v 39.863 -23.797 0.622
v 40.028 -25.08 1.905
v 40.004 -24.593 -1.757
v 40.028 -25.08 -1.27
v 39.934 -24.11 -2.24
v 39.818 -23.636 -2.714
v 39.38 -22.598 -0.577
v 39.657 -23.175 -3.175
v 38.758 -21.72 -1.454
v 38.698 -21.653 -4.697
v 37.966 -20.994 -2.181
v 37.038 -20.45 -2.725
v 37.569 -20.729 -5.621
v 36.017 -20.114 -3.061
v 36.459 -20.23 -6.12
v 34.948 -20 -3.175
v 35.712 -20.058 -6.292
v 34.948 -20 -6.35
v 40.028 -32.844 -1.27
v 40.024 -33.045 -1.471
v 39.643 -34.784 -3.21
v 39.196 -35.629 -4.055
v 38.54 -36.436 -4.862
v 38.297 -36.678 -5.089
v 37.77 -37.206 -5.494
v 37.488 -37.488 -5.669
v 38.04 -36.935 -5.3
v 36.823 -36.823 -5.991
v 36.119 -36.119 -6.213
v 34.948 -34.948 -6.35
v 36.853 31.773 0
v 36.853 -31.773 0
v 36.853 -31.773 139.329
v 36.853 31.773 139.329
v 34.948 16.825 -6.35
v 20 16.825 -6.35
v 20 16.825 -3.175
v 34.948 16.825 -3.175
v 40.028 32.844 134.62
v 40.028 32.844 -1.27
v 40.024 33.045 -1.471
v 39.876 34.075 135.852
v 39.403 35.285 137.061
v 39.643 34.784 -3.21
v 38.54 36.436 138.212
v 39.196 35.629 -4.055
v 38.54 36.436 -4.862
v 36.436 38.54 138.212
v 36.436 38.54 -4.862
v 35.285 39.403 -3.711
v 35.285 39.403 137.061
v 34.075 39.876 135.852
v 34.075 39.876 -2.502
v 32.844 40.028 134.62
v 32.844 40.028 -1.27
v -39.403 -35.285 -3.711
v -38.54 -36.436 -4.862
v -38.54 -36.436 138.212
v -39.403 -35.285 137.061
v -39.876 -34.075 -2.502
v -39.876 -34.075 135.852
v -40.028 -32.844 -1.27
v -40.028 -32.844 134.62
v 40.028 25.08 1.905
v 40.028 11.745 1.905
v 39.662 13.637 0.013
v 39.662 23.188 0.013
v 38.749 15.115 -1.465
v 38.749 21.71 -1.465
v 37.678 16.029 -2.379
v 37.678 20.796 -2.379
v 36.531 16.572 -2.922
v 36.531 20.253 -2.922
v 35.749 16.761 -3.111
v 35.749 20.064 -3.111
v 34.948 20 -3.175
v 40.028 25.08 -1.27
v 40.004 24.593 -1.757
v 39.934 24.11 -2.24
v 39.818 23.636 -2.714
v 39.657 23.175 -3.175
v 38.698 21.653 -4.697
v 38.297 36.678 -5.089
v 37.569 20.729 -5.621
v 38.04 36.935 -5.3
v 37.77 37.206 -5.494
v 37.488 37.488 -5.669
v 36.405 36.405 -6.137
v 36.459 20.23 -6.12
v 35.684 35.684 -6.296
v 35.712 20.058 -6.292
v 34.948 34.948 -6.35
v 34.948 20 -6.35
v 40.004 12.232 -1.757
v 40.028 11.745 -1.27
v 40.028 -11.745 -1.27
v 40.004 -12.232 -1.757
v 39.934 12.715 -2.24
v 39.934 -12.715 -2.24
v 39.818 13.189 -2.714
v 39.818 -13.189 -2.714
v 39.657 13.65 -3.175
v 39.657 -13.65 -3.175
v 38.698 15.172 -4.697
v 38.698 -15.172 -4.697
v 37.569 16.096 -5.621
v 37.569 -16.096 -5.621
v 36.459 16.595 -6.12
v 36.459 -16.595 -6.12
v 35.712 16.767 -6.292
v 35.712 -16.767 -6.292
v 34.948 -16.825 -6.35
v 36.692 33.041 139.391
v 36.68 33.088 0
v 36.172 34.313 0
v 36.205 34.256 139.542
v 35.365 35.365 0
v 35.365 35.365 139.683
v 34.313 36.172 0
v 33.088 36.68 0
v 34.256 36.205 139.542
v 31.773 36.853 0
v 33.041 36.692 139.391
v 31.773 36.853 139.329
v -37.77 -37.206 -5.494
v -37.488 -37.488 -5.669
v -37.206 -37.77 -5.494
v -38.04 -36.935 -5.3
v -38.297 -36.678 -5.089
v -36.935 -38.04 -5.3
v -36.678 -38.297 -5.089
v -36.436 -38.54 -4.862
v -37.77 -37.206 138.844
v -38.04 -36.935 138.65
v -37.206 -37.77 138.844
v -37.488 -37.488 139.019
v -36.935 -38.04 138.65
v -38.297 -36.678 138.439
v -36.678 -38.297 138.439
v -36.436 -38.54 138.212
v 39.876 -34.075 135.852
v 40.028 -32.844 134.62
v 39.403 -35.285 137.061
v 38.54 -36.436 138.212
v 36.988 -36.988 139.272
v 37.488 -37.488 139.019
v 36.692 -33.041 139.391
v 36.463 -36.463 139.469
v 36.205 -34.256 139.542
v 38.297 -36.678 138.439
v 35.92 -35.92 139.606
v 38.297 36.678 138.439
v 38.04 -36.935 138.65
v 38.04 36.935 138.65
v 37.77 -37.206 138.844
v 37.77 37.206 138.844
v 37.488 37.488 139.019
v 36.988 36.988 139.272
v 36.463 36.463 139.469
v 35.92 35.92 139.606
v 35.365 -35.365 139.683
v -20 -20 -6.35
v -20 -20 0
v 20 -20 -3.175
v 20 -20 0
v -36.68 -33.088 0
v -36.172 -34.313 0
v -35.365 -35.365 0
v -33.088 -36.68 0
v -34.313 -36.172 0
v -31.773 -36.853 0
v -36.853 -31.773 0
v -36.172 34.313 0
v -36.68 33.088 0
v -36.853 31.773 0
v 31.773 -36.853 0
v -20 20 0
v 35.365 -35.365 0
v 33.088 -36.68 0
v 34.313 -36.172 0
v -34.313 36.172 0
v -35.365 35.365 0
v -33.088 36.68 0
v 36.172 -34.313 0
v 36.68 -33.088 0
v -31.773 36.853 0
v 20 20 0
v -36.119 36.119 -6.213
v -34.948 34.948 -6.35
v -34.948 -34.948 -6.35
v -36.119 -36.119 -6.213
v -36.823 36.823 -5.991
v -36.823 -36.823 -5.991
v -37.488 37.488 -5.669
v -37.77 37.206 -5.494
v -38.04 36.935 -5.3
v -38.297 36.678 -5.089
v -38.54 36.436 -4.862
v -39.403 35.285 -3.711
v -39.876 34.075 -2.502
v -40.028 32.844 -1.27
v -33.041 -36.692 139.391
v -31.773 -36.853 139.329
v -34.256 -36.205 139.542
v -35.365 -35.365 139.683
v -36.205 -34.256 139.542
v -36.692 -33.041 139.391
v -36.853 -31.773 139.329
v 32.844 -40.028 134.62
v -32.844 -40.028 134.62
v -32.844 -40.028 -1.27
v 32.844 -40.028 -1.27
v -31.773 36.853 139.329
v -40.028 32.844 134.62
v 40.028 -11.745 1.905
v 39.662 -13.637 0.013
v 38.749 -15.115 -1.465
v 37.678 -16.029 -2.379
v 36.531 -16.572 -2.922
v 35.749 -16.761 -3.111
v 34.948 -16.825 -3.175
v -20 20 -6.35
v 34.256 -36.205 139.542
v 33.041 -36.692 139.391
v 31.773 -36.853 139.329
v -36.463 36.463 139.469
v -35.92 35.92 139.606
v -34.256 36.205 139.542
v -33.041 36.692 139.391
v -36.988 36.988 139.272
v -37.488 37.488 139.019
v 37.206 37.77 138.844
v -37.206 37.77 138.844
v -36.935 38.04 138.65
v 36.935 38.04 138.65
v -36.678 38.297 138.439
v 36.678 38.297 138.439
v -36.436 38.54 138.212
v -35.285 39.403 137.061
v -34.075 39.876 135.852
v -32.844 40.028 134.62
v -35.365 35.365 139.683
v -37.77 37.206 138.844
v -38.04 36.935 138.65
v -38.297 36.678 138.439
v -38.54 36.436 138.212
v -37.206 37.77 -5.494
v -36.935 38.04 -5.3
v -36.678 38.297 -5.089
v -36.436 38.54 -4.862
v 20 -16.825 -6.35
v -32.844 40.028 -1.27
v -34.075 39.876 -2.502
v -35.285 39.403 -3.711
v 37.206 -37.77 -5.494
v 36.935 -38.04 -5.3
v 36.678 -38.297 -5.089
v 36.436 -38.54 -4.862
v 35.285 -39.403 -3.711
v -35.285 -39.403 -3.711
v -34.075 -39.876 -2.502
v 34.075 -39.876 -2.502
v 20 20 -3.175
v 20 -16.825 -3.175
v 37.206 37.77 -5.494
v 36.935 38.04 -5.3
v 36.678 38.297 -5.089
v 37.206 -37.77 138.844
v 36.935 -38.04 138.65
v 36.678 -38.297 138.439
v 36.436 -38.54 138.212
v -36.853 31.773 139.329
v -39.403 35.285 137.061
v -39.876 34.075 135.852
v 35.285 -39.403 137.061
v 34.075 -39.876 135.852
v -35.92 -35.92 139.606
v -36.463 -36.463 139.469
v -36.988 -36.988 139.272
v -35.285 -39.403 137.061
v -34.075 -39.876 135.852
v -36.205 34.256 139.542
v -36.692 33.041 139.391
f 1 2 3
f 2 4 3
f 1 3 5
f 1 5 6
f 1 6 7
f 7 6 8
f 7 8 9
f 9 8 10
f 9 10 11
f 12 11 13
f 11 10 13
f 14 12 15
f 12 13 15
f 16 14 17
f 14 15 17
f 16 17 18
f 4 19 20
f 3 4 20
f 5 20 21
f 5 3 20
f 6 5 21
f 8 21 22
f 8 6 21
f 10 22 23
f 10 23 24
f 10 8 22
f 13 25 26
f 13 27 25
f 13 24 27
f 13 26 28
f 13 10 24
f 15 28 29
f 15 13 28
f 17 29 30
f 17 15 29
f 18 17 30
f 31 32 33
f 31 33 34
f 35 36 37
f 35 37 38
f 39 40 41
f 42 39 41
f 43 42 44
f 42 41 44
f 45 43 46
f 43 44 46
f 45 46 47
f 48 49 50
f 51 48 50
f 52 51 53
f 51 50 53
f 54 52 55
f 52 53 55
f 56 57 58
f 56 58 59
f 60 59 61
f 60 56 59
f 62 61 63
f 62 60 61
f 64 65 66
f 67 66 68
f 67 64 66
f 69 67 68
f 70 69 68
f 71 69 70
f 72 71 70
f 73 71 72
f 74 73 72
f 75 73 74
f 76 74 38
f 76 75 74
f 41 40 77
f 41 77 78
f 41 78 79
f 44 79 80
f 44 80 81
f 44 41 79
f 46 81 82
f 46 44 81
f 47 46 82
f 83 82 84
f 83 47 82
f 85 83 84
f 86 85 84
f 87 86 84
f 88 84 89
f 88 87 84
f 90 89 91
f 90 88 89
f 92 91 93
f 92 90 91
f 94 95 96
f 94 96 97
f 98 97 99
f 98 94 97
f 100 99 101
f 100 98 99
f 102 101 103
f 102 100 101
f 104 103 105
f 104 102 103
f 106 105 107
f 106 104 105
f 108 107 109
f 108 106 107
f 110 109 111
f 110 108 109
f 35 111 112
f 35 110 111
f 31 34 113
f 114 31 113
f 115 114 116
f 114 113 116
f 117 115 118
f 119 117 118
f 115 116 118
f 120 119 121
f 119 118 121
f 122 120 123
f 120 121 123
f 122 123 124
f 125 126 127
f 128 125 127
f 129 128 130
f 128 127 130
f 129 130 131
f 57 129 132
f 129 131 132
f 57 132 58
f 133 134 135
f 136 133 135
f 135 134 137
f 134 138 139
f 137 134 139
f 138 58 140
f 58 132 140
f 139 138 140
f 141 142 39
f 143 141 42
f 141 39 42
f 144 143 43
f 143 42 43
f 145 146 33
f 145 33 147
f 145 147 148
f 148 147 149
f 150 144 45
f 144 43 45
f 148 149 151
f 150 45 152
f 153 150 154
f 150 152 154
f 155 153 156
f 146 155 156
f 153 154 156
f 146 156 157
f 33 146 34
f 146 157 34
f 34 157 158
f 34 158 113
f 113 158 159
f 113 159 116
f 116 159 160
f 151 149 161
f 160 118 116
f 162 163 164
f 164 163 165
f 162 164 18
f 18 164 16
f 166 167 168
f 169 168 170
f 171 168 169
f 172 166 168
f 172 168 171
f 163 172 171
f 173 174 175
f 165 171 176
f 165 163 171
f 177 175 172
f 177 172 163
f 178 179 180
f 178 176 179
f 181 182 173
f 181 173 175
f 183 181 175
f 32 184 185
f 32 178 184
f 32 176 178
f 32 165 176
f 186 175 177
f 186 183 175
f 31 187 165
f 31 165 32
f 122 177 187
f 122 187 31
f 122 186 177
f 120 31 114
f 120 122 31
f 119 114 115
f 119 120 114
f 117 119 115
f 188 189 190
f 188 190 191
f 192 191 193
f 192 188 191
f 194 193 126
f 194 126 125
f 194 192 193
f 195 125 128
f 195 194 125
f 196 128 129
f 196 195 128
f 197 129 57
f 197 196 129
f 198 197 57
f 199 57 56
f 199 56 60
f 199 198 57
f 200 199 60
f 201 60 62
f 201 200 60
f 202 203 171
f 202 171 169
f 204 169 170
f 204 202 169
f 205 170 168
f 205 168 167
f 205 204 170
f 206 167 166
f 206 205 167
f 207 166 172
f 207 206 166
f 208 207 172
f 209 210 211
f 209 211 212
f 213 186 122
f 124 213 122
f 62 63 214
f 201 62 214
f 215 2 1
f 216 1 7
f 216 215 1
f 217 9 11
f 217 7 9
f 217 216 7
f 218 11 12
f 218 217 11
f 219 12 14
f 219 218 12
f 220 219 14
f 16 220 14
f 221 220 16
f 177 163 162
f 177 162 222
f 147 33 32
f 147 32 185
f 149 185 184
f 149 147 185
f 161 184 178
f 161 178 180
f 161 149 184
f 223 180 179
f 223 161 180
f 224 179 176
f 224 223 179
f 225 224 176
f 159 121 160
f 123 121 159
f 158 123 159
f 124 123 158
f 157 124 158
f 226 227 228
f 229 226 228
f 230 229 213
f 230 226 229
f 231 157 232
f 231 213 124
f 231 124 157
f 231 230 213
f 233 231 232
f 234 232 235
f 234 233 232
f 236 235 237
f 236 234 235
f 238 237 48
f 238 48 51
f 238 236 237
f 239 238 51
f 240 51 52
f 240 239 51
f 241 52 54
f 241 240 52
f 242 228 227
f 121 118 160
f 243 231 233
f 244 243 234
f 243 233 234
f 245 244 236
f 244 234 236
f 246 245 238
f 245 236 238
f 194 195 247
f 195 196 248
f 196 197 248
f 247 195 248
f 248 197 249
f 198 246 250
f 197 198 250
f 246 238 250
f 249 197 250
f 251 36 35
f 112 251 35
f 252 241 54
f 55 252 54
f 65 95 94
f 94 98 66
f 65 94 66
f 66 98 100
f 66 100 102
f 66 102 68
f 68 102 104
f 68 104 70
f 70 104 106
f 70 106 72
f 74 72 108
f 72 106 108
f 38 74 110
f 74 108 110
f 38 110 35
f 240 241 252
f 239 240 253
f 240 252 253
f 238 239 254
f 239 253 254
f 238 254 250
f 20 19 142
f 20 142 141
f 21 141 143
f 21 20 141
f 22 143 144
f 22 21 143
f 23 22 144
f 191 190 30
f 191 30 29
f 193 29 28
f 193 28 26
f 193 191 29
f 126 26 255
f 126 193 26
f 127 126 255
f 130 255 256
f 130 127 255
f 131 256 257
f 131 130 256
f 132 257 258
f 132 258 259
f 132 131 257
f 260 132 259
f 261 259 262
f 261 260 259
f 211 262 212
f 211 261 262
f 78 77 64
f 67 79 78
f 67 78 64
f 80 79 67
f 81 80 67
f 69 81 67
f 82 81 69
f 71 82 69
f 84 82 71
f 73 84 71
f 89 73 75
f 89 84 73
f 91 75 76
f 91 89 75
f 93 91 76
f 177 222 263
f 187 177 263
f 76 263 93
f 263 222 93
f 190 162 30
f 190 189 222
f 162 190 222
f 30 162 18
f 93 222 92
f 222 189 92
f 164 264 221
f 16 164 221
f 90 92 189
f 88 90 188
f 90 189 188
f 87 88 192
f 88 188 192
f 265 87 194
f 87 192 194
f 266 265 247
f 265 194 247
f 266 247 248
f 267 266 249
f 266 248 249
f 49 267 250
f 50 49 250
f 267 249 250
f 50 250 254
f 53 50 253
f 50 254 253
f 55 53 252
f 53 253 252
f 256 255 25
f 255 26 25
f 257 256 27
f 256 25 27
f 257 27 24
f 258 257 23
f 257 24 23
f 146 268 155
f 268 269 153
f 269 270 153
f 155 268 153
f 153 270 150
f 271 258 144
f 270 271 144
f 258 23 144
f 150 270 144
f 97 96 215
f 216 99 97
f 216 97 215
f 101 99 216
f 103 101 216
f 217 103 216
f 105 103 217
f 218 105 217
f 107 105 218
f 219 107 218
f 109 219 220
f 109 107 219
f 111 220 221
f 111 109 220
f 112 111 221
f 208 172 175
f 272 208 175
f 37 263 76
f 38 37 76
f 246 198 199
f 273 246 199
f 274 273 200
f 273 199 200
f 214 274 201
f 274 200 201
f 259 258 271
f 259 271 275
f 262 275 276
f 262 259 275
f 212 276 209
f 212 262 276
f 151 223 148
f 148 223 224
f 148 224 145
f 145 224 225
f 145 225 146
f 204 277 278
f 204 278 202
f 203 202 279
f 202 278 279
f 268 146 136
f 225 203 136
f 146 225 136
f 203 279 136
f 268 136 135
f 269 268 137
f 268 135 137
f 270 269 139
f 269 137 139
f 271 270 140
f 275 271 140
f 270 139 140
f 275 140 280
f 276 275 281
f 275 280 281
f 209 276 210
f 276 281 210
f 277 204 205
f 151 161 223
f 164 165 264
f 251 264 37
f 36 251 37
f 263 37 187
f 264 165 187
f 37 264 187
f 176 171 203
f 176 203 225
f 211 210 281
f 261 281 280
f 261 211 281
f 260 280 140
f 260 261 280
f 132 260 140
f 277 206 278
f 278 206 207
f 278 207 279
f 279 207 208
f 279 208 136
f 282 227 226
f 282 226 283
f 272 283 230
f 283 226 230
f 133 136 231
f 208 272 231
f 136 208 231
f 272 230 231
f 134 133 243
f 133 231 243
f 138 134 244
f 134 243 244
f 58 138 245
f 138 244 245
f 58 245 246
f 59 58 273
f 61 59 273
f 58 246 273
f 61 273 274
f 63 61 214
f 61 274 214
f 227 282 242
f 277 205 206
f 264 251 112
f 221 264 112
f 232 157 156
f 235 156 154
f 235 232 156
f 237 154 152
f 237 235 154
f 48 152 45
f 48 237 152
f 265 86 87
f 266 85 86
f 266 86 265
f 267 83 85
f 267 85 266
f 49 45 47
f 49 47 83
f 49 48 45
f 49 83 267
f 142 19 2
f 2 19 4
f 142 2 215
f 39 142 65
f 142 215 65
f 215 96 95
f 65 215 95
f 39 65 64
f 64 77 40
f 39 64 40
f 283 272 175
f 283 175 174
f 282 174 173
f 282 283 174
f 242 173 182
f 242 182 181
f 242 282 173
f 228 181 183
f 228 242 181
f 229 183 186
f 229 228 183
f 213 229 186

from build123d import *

# Parameters (mm, degrees)
F0_W         = 80.0557104707
F0_H         = 80.0557104707
F0_W_2       = 73.7057104707
F0_H_2       = 73.7057104707
F0_W_3       = 39.99992
F0_H_3       = 39.99992
F1_DEPTH     = 6.35
F2_DEPTH     = 9.144
F3_DEPTH     = 139.7
F4_W         = 20.0278952353
F4_H         = 3.175
F5_DEPTH     = 3.175
F6_SIZE      = 5.08
F7_T1_DEPTH  = 95.2957104707
F7_T3_DEPTH  = 156.5710244843
F7_T5_DEPTH  = 95.2957104707
F7_T7_DEPTH  = 40.3478952353
F7_T9_DEPTH  = 40.3478952353
F7_T11_DEPTH = 15.875
F7_T13_DEPTH = 3.175
F7_T15_DEPTH = 3.175
F7_T17_DEPTH = 59.04992
F7_T23_DEPTH = 28.575
F7_T27_DEPTH = 15.875
F7_T34_DEPTH = 28.575
F7_T38_DEPTH = 15.875
F7_T45_DEPTH = 15.875
F7_T49_DEPTH = 28.575
F7_T56_DEPTH = 15.875
F7_T60_DEPTH = 28.575
F8_R         = 5.08


# Not quite as in the source:
# - a fillet or chamfer that OpenCascade refuses, or shapes differently, is made with other operations: its cross-section is extruded or revolved along the edge and cut away or added


with BuildPart() as f1:
    # F0 (on Top) → F1 (new body)
    with BuildSketch(Plane.XY):
        Rectangle(F0_W, F0_H)
        Rectangle(F0_W_2, F0_H_2, mode=Mode.SUBTRACT)
        Rectangle(F0_W_2, F0_H_2)
        Rectangle(F0_W_3, F0_H_3, mode=Mode.SUBTRACT)
        Rectangle(F0_W_3, F0_H_3)
    extrude(amount=-F1_DEPTH)

    # F0 (on Top) → F2 (cut)
    with BuildSketch(Plane.XY):
        Rectangle(F0_W_3, F0_H_3)
    extrude(amount=-F2_DEPTH, mode=Mode.SUBTRACT)

    # F0 (on Top) → F3 (join)
    with BuildSketch(Plane.XY):
        Rectangle(F0_W, F0_H)
        Rectangle(F0_W_2, F0_H_2, mode=Mode.SUBTRACT)
    extrude(amount=F3_DEPTH)

    # F4 (on face) → F5 (cut)
    with BuildSketch(Plane(origin=(0, 0, -6.35), x_dir=(1, 0, 0), z_dir=(0, 0, -1))):
        with Locations((30.0139076177, 18.41246)):
            Rectangle(F4_W, F4_H)
        with Locations((30.0139076177, -18.41246)):
            Rectangle(F4_W, F4_H)
    extrude(amount=-F5_DEPTH, mode=Mode.SUBTRACT)

    # F6
    f6_edges = [f1.edges().sort_by_distance(p)[0] for p in [
        (40.027855, -40.027855, 66.675),
        (-40.027855, -40.027855, 66.675),
        (-40.027855, 40.027855, 66.675),
        (40.027855, 40.027855, 66.675),
    ]]
    chamfer(f6_edges, length=F6_SIZE)

    # F7: fillet of radius 5.08 on 24 edges, made by hand

    # F7_s2 → F7_t1 (cut)
    with BuildSketch(Plane.XZ.offset(-47.6478552353)):
        with BuildLine():
            ThreePointArc((-34.9478552353, -6.35), (-38.5399576838, -4.8621024484), (-40.0278552353, -1.27))
            Line((-40.0278552353, -1.27), (-40.0278552353, -6.35))
            Line((-40.0278552353, -6.35), (-34.9478552353, -6.35))
        make_face()
        with BuildLine():
            ThreePointArc((-34.9478552353, 139.7), (-38.5399576838, 138.2121024484), (-40.0278552353, 134.62))
            Line((-40.0278552353, 134.62), (-40.0278552353, 139.7))
            Line((-40.0278552353, 139.7), (-34.9478552353, 139.7))
        make_face()
        with BuildLine():
            ThreePointArc((40.0278552353, 134.62), (38.5399576838, 138.2121024484), (34.9478552353, 139.7))
            Line((34.9478552353, 139.7), (40.0278552353, 139.7))
            Line((40.0278552353, 139.7), (40.0278552353, 134.62))
        make_face()
    extrude(amount=F7_T1_DEPTH, mode=Mode.SUBTRACT)

    # F7_s4 → F7_t3 (cut)
    with BuildSketch(Plane.XY.offset(-11.6105122421)):
        with BuildLine():
            ThreePointArc((-38.5399576838, 36.4357527869), (-39.6411632605, 34.7876821749), (-40.0278552353, 32.8436503385))
            Line((-40.0278552353, 32.8436503385), (-40.0278552353, 34.9478552353))
            Line((-40.0278552353, 34.9478552353), (-38.5399576838, 36.4357527869))
        make_face()
        with BuildLine():
            ThreePointArc((-38.5399576838, -36.4357527869), (-39.6411632605, -34.7876821749), (-40.0278552353, -32.8436503385))
            Line((-40.0278552353, -32.8436503385), (-40.0278552353, -34.9478552353))
            Line((-40.0278552353, -34.9478552353), (-38.5399576838, -36.4357527869))
        make_face()
        with BuildLine():
            ThreePointArc((36.4357527869, 38.5399576838), (34.7876821749, 39.6411632605), (32.8436503385, 40.0278552353))
            Line((32.8436503385, 40.0278552353), (34.9478552353, 40.0278552353))
            Line((34.9478552353, 40.0278552353), (36.4357527869, 38.5399576838))
        make_face()
        with BuildLine():
            ThreePointArc((-32.8436503385, 40.0278552353), (-34.7876821749, 39.6411632605), (-36.4357527869, 38.5399576838))
            Line((-36.4357527869, 38.5399576838), (-34.9478552353, 40.0278552353))
            Line((-34.9478552353, 40.0278552353), (-32.8436503385, 40.0278552353))
        make_face()
        with BuildLine():
            ThreePointArc((40.0278552353, -32.8436503385), (39.6411632605, -34.7876821749), (38.5399576838, -36.4357527869))
            Line((38.5399576838, -36.4357527869), (40.0278552353, -34.9478552353))
            Line((40.0278552353, -34.9478552353), (40.0278552353, -32.8436503385))
        make_face()
        with BuildLine():
            ThreePointArc((40.0278552353, 32.8436503385), (39.6411632605, 34.7876821749), (38.5399576838, 36.4357527869))
            Line((38.5399576838, 36.4357527869), (40.0278552353, 34.9478552353))
            Line((40.0278552353, 34.9478552353), (40.0278552353, 32.8436503385))
        make_face()
        with BuildLine():
            ThreePointArc((-32.8436503385, -40.0278552353), (-34.7876821749, -39.6411632605), (-36.4357527869, -38.5399576838))
            Line((-36.4357527869, -38.5399576838), (-34.9478552353, -40.0278552353))
            Line((-34.9478552353, -40.0278552353), (-32.8436503385, -40.0278552353))
        make_face()
        with BuildLine():
            ThreePointArc((36.4357527869, -38.5399576838), (34.7876821749, -39.6411632605), (32.8436503385, -40.0278552353))
            Line((32.8436503385, -40.0278552353), (34.9478552353, -40.0278552353))
            Line((34.9478552353, -40.0278552353), (36.4357527869, -38.5399576838))
        make_face()
    extrude(amount=F7_T3_DEPTH, mode=Mode.SUBTRACT)

    # F7_s6 → F7_t5 (cut)
    with BuildSketch(Plane.YZ.offset(-47.6478552353)):
        with BuildLine():
            ThreePointArc((34.9478552353, -6.35), (38.5399576838, -4.8621024484), (40.0278552353, -1.27))
            Line((40.0278552353, -1.27), (40.0278552353, -6.35))
            Line((40.0278552353, -6.35), (34.9478552353, -6.35))
        make_face()
        with BuildLine():
            ThreePointArc((34.9478552353, 139.7), (38.5399576838, 138.2121024484), (40.0278552353, 134.62))
            Line((40.0278552353, 134.62), (40.0278552353, 139.7))
            Line((40.0278552353, 139.7), (34.9478552353, 139.7))
        make_face()
        with BuildLine():
            ThreePointArc((-34.9478552353, -6.35), (-38.5399576838, -4.8621024484), (-40.0278552353, -1.27))
            Line((-40.0278552353, -1.27), (-40.0278552353, -6.35))
            Line((-40.0278552353, -6.35), (-34.9478552353, -6.35))
        make_face()
        with BuildLine():
            ThreePointArc((-34.9478552353, 139.7), (-38.5399576838, 138.2121024484), (-40.0278552353, 134.62))
            Line((-40.0278552353, 134.62), (-40.0278552353, 139.7))
            Line((-40.0278552353, 139.7), (-34.9478552353, 139.7))
        make_face()
    extrude(amount=F7_T5_DEPTH, mode=Mode.SUBTRACT)

    # F7_s8 → F7_t7 (cut)
    with BuildSketch(Plane.XZ.offset(7.29996)):
        with BuildLine():
            ThreePointArc((40.0278552353, -1.27), (38.5399576838, -4.8621024484), (34.9478552353, -6.35))
            Line((34.9478552353, -6.35), (40.0278552353, -6.35))
            Line((40.0278552353, -6.35), (40.0278552353, -1.27))
        make_face()
    extrude(amount=F7_T7_DEPTH, mode=Mode.SUBTRACT)

    # F7_s10 → F7_t9 (cut)
    with BuildSketch(Plane.XZ.offset(-47.6478552353)):
        with BuildLine():
            ThreePointArc((40.0278552353, -1.27), (38.5399576838, -4.8621024484), (34.9478552353, -6.35))
            Line((34.9478552353, -6.35), (40.0278552353, -6.35))
            Line((40.0278552353, -6.35), (40.0278552353, -1.27))
        make_face()
    extrude(amount=F7_T9_DEPTH, mode=Mode.SUBTRACT)

    # F7_s12 → F7_t11 (cut)
    with BuildSketch(Plane.XY.offset(-19.05)):
        with BuildLine():
            ThreePointArc((40.0278552353, -25.07996), (38.5399576838, -21.4878575516), (34.9478552353, -19.99996))
            Line((34.9478552353, -19.99996), (40.0278552353, -19.99996))
            Line((40.0278552353, -19.99996), (40.0278552353, -25.07996))
        make_face()
        with BuildLine():
            ThreePointArc((40.0278552353, 25.07996), (38.5399576838, 21.4878575516), (34.9478552353, 19.99996))
            Line((34.9478552353, 19.99996), (40.0278552353, 19.99996))
            Line((40.0278552353, 19.99996), (40.0278552353, 25.07996))
        make_face()
        with BuildLine():
            ThreePointArc((40.0278552353, -11.74496), (38.5399576838, -15.3370624484), (34.9478552353, -16.82496))
            Line((34.9478552353, -16.82496), (40.0278552353, -16.82496))
            Line((40.0278552353, -16.82496), (40.0278552353, -11.74496))
        make_face()
        with BuildLine():
            ThreePointArc((40.0278552353, 11.74496), (38.5399576838, 15.3370624484), (34.9478552353, 16.82496))
            Line((34.9478552353, 16.82496), (40.0278552353, 16.82496))
            Line((40.0278552353, 16.82496), (40.0278552353, 11.74496))
        make_face()
    extrude(amount=F7_T11_DEPTH, mode=Mode.SUBTRACT)

    # F7_s14 → F7_t13 (cut)
    with BuildSketch(Plane.XZ.offset(16.82496)):
        with BuildLine():
            ThreePointArc((40.0278552353, 1.905), (38.5399576838, -1.6871024484), (34.9478552353, -3.175))
            Line((34.9478552353, -3.175), (40.0278552353, -3.175))
            Line((40.0278552353, -3.175), (40.0278552353, 1.905))
        make_face()
    extrude(amount=F7_T13_DEPTH, mode=Mode.SUBTRACT)

    # F7_s16 → F7_t15 (cut)
    with BuildSketch(Plane.XZ.offset(-19.99996)):
        with BuildLine():
            ThreePointArc((40.0278552353, 1.905), (38.5399576838, -1.6871024484), (34.9478552353, -3.175))
            Line((34.9478552353, -3.175), (40.0278552353, -3.175))
            Line((40.0278552353, -3.175), (40.0278552353, 1.905))
        make_face()
    extrude(amount=F7_T15_DEPTH, mode=Mode.SUBTRACT)

    # F7_s18 → F7_t17 (cut)
    with BuildSketch(Plane.XZ.offset(-29.52496)):
        with BuildLine():
            ThreePointArc((40.0278552353, -1.27), (38.5399576838, -4.8621024484), (34.9478552353, -6.35))
            Line((34.9478552353, -6.35), (40.0278552353, -6.35))
            Line((40.0278552353, -6.35), (40.0278552353, -1.27))
        make_face()
    extrude(amount=F7_T17_DEPTH, mode=Mode.SUBTRACT)


with BuildPart() as f7_tool21:
    # F7_s22 → F7_t23 (new body)
    with BuildSketch(Plane.XY.offset(-19.05)):
        with BuildLine():
            ThreePointArc((40.0278552353, -25.07996), (38.5399576838, -21.4878575516), (34.9478552353, -19.99996))
            Line((34.9478552353, -19.99996), (40.0278552353, -19.99996))
            Line((40.0278552353, -19.99996), (40.0278552353, -25.07996))
        make_face()
    extrude(amount=F7_T23_DEPTH)

    split(bisect_by=Plane.XY.offset(-3.175), keep=Keep.TOP)


with BuildPart() as f7_tool25:
    # F7_s26 → F7_t27 (new body)
    with BuildSketch(Plane.XZ.offset(16.82496)):
        with BuildLine():
            ThreePointArc((40.0278552353, 1.905), (38.5399576838, -1.6871024484), (34.9478552353, -3.175))
            Line((34.9478552353, -3.175), (40.0278552353, -3.175))
            Line((40.0278552353, -3.175), (40.0278552353, 1.905))
        make_face()
    extrude(amount=F7_T27_DEPTH)

    split(bisect_by=Plane.XZ.offset(19.99996), keep=Keep.TOP)


with BuildPart() as f7_tool21_1:
    add(f7_tool21.part)

    # F7_t29: intersect F7_tool25
    add(f7_tool25.part, mode=Mode.INTERSECT)


with BuildPart() as f1_1:
    add(f1.part)

    # F7_t19: cut F7_tool21
    add(f7_tool21_1.part, mode=Mode.SUBTRACT)


with BuildPart() as f7_tool32:
    # F7_s33 → F7_t34 (new body)
    with BuildSketch(Plane.XY.offset(-19.05)):
        with BuildLine():
            ThreePointArc((40.0278552353, 25.07996), (38.5399576838, 21.4878575516), (34.9478552353, 19.99996))
            Line((34.9478552353, 19.99996), (40.0278552353, 19.99996))
            Line((40.0278552353, 19.99996), (40.0278552353, 25.07996))
        make_face()
    extrude(amount=F7_T34_DEPTH)

    split(bisect_by=Plane.XY.offset(-3.175), keep=Keep.TOP)


with BuildPart() as f7_tool36:
    # F7_s37 → F7_t38 (new body)
    with BuildSketch(Plane.XZ.offset(-32.69996)):
        with BuildLine():
            ThreePointArc((40.0278552353, 1.905), (38.5399576838, -1.6871024484), (34.9478552353, -3.175))
            Line((34.9478552353, -3.175), (40.0278552353, -3.175))
            Line((40.0278552353, -3.175), (40.0278552353, 1.905))
        make_face()
    extrude(amount=F7_T38_DEPTH)

    split(bisect_by=Plane.XZ.offset(-19.99996), keep=Keep.BOTTOM)


with BuildPart() as f7_tool32_1:
    add(f7_tool32.part)

    # F7_t40: intersect F7_tool36
    add(f7_tool36.part, mode=Mode.INTERSECT)


with BuildPart() as f1_2:
    add(f1_1.part)

    # F7_t30: cut F7_tool32
    add(f7_tool32_1.part, mode=Mode.SUBTRACT)


with BuildPart() as f7_tool43:
    # F7_s44 → F7_t45 (new body)
    with BuildSketch(Plane.XZ.offset(4.12496)):
        with BuildLine():
            ThreePointArc((40.0278552353, 1.905), (38.5399576838, -1.6871024484), (34.9478552353, -3.175))
            Line((34.9478552353, -3.175), (40.0278552353, -3.175))
            Line((40.0278552353, -3.175), (40.0278552353, 1.905))
        make_face()
    extrude(amount=F7_T45_DEPTH)

    split(bisect_by=Plane.XZ.offset(16.82496), keep=Keep.BOTTOM)


with BuildPart() as f7_tool47:
    # F7_s48 → F7_t49 (new body)
    with BuildSketch(Plane.XY.offset(-19.05)):
        with BuildLine():
            ThreePointArc((40.0278552353, -11.74496), (38.5399576838, -15.3370624484), (34.9478552353, -16.82496))
            Line((34.9478552353, -16.82496), (40.0278552353, -16.82496))
            Line((40.0278552353, -16.82496), (40.0278552353, -11.74496))
        make_face()
    extrude(amount=F7_T49_DEPTH)

    split(bisect_by=Plane.XY.offset(-3.175), keep=Keep.TOP)


with BuildPart() as f7_tool43_1:
    add(f7_tool43.part)

    # F7_t51: intersect F7_tool47
    add(f7_tool47.part, mode=Mode.INTERSECT)


with BuildPart() as f1_3:
    add(f1_2.part)

    # F7_t41: cut F7_tool43
    add(f7_tool43_1.part, mode=Mode.SUBTRACT)


with BuildPart() as f7_tool54:
    # F7_s55 → F7_t56 (new body)
    with BuildSketch(Plane.XZ.offset(-19.99996)):
        with BuildLine():
            ThreePointArc((40.0278552353, 1.905), (38.5399576838, -1.6871024484), (34.9478552353, -3.175))
            Line((34.9478552353, -3.175), (40.0278552353, -3.175))
            Line((40.0278552353, -3.175), (40.0278552353, 1.905))
        make_face()
    extrude(amount=F7_T56_DEPTH)

    split(bisect_by=Plane.XZ.offset(-16.82496), keep=Keep.TOP)


with BuildPart() as f7_tool58:
    # F7_s59 → F7_t60 (new body)
    with BuildSketch(Plane.XY.offset(-19.05)):
        with BuildLine():
            ThreePointArc((40.0278552353, 11.74496), (38.5399576838, 15.3370624484), (34.9478552353, 16.82496))
            Line((34.9478552353, 16.82496), (40.0278552353, 16.82496))
            Line((40.0278552353, 16.82496), (40.0278552353, 11.74496))
        make_face()
    extrude(amount=F7_T60_DEPTH)

    split(bisect_by=Plane.XY.offset(-3.175), keep=Keep.TOP)


with BuildPart() as f7_tool54_1:
    add(f7_tool54.part)

    # F7_t62: intersect F7_tool58
    add(f7_tool58.part, mode=Mode.INTERSECT)


with BuildPart() as f1_4:
    add(f1_3.part)

    # F7_t52: cut F7_tool54
    add(f7_tool54_1.part, mode=Mode.SUBTRACT)

    # F8
    f8_edges = [f1_4.edges().sort_by_distance(p)[0] for p in [
        (36.852855, 36.852855, 69.664643),
        (36.852855, -36.852855, 69.664643),
        (-36.852855, -36.852855, 69.664643),
        (-36.852855, 36.852855, 69.664643),
    ]]
    fillet(f8_edges, radius=F8_R)


solid = f1_4.part
